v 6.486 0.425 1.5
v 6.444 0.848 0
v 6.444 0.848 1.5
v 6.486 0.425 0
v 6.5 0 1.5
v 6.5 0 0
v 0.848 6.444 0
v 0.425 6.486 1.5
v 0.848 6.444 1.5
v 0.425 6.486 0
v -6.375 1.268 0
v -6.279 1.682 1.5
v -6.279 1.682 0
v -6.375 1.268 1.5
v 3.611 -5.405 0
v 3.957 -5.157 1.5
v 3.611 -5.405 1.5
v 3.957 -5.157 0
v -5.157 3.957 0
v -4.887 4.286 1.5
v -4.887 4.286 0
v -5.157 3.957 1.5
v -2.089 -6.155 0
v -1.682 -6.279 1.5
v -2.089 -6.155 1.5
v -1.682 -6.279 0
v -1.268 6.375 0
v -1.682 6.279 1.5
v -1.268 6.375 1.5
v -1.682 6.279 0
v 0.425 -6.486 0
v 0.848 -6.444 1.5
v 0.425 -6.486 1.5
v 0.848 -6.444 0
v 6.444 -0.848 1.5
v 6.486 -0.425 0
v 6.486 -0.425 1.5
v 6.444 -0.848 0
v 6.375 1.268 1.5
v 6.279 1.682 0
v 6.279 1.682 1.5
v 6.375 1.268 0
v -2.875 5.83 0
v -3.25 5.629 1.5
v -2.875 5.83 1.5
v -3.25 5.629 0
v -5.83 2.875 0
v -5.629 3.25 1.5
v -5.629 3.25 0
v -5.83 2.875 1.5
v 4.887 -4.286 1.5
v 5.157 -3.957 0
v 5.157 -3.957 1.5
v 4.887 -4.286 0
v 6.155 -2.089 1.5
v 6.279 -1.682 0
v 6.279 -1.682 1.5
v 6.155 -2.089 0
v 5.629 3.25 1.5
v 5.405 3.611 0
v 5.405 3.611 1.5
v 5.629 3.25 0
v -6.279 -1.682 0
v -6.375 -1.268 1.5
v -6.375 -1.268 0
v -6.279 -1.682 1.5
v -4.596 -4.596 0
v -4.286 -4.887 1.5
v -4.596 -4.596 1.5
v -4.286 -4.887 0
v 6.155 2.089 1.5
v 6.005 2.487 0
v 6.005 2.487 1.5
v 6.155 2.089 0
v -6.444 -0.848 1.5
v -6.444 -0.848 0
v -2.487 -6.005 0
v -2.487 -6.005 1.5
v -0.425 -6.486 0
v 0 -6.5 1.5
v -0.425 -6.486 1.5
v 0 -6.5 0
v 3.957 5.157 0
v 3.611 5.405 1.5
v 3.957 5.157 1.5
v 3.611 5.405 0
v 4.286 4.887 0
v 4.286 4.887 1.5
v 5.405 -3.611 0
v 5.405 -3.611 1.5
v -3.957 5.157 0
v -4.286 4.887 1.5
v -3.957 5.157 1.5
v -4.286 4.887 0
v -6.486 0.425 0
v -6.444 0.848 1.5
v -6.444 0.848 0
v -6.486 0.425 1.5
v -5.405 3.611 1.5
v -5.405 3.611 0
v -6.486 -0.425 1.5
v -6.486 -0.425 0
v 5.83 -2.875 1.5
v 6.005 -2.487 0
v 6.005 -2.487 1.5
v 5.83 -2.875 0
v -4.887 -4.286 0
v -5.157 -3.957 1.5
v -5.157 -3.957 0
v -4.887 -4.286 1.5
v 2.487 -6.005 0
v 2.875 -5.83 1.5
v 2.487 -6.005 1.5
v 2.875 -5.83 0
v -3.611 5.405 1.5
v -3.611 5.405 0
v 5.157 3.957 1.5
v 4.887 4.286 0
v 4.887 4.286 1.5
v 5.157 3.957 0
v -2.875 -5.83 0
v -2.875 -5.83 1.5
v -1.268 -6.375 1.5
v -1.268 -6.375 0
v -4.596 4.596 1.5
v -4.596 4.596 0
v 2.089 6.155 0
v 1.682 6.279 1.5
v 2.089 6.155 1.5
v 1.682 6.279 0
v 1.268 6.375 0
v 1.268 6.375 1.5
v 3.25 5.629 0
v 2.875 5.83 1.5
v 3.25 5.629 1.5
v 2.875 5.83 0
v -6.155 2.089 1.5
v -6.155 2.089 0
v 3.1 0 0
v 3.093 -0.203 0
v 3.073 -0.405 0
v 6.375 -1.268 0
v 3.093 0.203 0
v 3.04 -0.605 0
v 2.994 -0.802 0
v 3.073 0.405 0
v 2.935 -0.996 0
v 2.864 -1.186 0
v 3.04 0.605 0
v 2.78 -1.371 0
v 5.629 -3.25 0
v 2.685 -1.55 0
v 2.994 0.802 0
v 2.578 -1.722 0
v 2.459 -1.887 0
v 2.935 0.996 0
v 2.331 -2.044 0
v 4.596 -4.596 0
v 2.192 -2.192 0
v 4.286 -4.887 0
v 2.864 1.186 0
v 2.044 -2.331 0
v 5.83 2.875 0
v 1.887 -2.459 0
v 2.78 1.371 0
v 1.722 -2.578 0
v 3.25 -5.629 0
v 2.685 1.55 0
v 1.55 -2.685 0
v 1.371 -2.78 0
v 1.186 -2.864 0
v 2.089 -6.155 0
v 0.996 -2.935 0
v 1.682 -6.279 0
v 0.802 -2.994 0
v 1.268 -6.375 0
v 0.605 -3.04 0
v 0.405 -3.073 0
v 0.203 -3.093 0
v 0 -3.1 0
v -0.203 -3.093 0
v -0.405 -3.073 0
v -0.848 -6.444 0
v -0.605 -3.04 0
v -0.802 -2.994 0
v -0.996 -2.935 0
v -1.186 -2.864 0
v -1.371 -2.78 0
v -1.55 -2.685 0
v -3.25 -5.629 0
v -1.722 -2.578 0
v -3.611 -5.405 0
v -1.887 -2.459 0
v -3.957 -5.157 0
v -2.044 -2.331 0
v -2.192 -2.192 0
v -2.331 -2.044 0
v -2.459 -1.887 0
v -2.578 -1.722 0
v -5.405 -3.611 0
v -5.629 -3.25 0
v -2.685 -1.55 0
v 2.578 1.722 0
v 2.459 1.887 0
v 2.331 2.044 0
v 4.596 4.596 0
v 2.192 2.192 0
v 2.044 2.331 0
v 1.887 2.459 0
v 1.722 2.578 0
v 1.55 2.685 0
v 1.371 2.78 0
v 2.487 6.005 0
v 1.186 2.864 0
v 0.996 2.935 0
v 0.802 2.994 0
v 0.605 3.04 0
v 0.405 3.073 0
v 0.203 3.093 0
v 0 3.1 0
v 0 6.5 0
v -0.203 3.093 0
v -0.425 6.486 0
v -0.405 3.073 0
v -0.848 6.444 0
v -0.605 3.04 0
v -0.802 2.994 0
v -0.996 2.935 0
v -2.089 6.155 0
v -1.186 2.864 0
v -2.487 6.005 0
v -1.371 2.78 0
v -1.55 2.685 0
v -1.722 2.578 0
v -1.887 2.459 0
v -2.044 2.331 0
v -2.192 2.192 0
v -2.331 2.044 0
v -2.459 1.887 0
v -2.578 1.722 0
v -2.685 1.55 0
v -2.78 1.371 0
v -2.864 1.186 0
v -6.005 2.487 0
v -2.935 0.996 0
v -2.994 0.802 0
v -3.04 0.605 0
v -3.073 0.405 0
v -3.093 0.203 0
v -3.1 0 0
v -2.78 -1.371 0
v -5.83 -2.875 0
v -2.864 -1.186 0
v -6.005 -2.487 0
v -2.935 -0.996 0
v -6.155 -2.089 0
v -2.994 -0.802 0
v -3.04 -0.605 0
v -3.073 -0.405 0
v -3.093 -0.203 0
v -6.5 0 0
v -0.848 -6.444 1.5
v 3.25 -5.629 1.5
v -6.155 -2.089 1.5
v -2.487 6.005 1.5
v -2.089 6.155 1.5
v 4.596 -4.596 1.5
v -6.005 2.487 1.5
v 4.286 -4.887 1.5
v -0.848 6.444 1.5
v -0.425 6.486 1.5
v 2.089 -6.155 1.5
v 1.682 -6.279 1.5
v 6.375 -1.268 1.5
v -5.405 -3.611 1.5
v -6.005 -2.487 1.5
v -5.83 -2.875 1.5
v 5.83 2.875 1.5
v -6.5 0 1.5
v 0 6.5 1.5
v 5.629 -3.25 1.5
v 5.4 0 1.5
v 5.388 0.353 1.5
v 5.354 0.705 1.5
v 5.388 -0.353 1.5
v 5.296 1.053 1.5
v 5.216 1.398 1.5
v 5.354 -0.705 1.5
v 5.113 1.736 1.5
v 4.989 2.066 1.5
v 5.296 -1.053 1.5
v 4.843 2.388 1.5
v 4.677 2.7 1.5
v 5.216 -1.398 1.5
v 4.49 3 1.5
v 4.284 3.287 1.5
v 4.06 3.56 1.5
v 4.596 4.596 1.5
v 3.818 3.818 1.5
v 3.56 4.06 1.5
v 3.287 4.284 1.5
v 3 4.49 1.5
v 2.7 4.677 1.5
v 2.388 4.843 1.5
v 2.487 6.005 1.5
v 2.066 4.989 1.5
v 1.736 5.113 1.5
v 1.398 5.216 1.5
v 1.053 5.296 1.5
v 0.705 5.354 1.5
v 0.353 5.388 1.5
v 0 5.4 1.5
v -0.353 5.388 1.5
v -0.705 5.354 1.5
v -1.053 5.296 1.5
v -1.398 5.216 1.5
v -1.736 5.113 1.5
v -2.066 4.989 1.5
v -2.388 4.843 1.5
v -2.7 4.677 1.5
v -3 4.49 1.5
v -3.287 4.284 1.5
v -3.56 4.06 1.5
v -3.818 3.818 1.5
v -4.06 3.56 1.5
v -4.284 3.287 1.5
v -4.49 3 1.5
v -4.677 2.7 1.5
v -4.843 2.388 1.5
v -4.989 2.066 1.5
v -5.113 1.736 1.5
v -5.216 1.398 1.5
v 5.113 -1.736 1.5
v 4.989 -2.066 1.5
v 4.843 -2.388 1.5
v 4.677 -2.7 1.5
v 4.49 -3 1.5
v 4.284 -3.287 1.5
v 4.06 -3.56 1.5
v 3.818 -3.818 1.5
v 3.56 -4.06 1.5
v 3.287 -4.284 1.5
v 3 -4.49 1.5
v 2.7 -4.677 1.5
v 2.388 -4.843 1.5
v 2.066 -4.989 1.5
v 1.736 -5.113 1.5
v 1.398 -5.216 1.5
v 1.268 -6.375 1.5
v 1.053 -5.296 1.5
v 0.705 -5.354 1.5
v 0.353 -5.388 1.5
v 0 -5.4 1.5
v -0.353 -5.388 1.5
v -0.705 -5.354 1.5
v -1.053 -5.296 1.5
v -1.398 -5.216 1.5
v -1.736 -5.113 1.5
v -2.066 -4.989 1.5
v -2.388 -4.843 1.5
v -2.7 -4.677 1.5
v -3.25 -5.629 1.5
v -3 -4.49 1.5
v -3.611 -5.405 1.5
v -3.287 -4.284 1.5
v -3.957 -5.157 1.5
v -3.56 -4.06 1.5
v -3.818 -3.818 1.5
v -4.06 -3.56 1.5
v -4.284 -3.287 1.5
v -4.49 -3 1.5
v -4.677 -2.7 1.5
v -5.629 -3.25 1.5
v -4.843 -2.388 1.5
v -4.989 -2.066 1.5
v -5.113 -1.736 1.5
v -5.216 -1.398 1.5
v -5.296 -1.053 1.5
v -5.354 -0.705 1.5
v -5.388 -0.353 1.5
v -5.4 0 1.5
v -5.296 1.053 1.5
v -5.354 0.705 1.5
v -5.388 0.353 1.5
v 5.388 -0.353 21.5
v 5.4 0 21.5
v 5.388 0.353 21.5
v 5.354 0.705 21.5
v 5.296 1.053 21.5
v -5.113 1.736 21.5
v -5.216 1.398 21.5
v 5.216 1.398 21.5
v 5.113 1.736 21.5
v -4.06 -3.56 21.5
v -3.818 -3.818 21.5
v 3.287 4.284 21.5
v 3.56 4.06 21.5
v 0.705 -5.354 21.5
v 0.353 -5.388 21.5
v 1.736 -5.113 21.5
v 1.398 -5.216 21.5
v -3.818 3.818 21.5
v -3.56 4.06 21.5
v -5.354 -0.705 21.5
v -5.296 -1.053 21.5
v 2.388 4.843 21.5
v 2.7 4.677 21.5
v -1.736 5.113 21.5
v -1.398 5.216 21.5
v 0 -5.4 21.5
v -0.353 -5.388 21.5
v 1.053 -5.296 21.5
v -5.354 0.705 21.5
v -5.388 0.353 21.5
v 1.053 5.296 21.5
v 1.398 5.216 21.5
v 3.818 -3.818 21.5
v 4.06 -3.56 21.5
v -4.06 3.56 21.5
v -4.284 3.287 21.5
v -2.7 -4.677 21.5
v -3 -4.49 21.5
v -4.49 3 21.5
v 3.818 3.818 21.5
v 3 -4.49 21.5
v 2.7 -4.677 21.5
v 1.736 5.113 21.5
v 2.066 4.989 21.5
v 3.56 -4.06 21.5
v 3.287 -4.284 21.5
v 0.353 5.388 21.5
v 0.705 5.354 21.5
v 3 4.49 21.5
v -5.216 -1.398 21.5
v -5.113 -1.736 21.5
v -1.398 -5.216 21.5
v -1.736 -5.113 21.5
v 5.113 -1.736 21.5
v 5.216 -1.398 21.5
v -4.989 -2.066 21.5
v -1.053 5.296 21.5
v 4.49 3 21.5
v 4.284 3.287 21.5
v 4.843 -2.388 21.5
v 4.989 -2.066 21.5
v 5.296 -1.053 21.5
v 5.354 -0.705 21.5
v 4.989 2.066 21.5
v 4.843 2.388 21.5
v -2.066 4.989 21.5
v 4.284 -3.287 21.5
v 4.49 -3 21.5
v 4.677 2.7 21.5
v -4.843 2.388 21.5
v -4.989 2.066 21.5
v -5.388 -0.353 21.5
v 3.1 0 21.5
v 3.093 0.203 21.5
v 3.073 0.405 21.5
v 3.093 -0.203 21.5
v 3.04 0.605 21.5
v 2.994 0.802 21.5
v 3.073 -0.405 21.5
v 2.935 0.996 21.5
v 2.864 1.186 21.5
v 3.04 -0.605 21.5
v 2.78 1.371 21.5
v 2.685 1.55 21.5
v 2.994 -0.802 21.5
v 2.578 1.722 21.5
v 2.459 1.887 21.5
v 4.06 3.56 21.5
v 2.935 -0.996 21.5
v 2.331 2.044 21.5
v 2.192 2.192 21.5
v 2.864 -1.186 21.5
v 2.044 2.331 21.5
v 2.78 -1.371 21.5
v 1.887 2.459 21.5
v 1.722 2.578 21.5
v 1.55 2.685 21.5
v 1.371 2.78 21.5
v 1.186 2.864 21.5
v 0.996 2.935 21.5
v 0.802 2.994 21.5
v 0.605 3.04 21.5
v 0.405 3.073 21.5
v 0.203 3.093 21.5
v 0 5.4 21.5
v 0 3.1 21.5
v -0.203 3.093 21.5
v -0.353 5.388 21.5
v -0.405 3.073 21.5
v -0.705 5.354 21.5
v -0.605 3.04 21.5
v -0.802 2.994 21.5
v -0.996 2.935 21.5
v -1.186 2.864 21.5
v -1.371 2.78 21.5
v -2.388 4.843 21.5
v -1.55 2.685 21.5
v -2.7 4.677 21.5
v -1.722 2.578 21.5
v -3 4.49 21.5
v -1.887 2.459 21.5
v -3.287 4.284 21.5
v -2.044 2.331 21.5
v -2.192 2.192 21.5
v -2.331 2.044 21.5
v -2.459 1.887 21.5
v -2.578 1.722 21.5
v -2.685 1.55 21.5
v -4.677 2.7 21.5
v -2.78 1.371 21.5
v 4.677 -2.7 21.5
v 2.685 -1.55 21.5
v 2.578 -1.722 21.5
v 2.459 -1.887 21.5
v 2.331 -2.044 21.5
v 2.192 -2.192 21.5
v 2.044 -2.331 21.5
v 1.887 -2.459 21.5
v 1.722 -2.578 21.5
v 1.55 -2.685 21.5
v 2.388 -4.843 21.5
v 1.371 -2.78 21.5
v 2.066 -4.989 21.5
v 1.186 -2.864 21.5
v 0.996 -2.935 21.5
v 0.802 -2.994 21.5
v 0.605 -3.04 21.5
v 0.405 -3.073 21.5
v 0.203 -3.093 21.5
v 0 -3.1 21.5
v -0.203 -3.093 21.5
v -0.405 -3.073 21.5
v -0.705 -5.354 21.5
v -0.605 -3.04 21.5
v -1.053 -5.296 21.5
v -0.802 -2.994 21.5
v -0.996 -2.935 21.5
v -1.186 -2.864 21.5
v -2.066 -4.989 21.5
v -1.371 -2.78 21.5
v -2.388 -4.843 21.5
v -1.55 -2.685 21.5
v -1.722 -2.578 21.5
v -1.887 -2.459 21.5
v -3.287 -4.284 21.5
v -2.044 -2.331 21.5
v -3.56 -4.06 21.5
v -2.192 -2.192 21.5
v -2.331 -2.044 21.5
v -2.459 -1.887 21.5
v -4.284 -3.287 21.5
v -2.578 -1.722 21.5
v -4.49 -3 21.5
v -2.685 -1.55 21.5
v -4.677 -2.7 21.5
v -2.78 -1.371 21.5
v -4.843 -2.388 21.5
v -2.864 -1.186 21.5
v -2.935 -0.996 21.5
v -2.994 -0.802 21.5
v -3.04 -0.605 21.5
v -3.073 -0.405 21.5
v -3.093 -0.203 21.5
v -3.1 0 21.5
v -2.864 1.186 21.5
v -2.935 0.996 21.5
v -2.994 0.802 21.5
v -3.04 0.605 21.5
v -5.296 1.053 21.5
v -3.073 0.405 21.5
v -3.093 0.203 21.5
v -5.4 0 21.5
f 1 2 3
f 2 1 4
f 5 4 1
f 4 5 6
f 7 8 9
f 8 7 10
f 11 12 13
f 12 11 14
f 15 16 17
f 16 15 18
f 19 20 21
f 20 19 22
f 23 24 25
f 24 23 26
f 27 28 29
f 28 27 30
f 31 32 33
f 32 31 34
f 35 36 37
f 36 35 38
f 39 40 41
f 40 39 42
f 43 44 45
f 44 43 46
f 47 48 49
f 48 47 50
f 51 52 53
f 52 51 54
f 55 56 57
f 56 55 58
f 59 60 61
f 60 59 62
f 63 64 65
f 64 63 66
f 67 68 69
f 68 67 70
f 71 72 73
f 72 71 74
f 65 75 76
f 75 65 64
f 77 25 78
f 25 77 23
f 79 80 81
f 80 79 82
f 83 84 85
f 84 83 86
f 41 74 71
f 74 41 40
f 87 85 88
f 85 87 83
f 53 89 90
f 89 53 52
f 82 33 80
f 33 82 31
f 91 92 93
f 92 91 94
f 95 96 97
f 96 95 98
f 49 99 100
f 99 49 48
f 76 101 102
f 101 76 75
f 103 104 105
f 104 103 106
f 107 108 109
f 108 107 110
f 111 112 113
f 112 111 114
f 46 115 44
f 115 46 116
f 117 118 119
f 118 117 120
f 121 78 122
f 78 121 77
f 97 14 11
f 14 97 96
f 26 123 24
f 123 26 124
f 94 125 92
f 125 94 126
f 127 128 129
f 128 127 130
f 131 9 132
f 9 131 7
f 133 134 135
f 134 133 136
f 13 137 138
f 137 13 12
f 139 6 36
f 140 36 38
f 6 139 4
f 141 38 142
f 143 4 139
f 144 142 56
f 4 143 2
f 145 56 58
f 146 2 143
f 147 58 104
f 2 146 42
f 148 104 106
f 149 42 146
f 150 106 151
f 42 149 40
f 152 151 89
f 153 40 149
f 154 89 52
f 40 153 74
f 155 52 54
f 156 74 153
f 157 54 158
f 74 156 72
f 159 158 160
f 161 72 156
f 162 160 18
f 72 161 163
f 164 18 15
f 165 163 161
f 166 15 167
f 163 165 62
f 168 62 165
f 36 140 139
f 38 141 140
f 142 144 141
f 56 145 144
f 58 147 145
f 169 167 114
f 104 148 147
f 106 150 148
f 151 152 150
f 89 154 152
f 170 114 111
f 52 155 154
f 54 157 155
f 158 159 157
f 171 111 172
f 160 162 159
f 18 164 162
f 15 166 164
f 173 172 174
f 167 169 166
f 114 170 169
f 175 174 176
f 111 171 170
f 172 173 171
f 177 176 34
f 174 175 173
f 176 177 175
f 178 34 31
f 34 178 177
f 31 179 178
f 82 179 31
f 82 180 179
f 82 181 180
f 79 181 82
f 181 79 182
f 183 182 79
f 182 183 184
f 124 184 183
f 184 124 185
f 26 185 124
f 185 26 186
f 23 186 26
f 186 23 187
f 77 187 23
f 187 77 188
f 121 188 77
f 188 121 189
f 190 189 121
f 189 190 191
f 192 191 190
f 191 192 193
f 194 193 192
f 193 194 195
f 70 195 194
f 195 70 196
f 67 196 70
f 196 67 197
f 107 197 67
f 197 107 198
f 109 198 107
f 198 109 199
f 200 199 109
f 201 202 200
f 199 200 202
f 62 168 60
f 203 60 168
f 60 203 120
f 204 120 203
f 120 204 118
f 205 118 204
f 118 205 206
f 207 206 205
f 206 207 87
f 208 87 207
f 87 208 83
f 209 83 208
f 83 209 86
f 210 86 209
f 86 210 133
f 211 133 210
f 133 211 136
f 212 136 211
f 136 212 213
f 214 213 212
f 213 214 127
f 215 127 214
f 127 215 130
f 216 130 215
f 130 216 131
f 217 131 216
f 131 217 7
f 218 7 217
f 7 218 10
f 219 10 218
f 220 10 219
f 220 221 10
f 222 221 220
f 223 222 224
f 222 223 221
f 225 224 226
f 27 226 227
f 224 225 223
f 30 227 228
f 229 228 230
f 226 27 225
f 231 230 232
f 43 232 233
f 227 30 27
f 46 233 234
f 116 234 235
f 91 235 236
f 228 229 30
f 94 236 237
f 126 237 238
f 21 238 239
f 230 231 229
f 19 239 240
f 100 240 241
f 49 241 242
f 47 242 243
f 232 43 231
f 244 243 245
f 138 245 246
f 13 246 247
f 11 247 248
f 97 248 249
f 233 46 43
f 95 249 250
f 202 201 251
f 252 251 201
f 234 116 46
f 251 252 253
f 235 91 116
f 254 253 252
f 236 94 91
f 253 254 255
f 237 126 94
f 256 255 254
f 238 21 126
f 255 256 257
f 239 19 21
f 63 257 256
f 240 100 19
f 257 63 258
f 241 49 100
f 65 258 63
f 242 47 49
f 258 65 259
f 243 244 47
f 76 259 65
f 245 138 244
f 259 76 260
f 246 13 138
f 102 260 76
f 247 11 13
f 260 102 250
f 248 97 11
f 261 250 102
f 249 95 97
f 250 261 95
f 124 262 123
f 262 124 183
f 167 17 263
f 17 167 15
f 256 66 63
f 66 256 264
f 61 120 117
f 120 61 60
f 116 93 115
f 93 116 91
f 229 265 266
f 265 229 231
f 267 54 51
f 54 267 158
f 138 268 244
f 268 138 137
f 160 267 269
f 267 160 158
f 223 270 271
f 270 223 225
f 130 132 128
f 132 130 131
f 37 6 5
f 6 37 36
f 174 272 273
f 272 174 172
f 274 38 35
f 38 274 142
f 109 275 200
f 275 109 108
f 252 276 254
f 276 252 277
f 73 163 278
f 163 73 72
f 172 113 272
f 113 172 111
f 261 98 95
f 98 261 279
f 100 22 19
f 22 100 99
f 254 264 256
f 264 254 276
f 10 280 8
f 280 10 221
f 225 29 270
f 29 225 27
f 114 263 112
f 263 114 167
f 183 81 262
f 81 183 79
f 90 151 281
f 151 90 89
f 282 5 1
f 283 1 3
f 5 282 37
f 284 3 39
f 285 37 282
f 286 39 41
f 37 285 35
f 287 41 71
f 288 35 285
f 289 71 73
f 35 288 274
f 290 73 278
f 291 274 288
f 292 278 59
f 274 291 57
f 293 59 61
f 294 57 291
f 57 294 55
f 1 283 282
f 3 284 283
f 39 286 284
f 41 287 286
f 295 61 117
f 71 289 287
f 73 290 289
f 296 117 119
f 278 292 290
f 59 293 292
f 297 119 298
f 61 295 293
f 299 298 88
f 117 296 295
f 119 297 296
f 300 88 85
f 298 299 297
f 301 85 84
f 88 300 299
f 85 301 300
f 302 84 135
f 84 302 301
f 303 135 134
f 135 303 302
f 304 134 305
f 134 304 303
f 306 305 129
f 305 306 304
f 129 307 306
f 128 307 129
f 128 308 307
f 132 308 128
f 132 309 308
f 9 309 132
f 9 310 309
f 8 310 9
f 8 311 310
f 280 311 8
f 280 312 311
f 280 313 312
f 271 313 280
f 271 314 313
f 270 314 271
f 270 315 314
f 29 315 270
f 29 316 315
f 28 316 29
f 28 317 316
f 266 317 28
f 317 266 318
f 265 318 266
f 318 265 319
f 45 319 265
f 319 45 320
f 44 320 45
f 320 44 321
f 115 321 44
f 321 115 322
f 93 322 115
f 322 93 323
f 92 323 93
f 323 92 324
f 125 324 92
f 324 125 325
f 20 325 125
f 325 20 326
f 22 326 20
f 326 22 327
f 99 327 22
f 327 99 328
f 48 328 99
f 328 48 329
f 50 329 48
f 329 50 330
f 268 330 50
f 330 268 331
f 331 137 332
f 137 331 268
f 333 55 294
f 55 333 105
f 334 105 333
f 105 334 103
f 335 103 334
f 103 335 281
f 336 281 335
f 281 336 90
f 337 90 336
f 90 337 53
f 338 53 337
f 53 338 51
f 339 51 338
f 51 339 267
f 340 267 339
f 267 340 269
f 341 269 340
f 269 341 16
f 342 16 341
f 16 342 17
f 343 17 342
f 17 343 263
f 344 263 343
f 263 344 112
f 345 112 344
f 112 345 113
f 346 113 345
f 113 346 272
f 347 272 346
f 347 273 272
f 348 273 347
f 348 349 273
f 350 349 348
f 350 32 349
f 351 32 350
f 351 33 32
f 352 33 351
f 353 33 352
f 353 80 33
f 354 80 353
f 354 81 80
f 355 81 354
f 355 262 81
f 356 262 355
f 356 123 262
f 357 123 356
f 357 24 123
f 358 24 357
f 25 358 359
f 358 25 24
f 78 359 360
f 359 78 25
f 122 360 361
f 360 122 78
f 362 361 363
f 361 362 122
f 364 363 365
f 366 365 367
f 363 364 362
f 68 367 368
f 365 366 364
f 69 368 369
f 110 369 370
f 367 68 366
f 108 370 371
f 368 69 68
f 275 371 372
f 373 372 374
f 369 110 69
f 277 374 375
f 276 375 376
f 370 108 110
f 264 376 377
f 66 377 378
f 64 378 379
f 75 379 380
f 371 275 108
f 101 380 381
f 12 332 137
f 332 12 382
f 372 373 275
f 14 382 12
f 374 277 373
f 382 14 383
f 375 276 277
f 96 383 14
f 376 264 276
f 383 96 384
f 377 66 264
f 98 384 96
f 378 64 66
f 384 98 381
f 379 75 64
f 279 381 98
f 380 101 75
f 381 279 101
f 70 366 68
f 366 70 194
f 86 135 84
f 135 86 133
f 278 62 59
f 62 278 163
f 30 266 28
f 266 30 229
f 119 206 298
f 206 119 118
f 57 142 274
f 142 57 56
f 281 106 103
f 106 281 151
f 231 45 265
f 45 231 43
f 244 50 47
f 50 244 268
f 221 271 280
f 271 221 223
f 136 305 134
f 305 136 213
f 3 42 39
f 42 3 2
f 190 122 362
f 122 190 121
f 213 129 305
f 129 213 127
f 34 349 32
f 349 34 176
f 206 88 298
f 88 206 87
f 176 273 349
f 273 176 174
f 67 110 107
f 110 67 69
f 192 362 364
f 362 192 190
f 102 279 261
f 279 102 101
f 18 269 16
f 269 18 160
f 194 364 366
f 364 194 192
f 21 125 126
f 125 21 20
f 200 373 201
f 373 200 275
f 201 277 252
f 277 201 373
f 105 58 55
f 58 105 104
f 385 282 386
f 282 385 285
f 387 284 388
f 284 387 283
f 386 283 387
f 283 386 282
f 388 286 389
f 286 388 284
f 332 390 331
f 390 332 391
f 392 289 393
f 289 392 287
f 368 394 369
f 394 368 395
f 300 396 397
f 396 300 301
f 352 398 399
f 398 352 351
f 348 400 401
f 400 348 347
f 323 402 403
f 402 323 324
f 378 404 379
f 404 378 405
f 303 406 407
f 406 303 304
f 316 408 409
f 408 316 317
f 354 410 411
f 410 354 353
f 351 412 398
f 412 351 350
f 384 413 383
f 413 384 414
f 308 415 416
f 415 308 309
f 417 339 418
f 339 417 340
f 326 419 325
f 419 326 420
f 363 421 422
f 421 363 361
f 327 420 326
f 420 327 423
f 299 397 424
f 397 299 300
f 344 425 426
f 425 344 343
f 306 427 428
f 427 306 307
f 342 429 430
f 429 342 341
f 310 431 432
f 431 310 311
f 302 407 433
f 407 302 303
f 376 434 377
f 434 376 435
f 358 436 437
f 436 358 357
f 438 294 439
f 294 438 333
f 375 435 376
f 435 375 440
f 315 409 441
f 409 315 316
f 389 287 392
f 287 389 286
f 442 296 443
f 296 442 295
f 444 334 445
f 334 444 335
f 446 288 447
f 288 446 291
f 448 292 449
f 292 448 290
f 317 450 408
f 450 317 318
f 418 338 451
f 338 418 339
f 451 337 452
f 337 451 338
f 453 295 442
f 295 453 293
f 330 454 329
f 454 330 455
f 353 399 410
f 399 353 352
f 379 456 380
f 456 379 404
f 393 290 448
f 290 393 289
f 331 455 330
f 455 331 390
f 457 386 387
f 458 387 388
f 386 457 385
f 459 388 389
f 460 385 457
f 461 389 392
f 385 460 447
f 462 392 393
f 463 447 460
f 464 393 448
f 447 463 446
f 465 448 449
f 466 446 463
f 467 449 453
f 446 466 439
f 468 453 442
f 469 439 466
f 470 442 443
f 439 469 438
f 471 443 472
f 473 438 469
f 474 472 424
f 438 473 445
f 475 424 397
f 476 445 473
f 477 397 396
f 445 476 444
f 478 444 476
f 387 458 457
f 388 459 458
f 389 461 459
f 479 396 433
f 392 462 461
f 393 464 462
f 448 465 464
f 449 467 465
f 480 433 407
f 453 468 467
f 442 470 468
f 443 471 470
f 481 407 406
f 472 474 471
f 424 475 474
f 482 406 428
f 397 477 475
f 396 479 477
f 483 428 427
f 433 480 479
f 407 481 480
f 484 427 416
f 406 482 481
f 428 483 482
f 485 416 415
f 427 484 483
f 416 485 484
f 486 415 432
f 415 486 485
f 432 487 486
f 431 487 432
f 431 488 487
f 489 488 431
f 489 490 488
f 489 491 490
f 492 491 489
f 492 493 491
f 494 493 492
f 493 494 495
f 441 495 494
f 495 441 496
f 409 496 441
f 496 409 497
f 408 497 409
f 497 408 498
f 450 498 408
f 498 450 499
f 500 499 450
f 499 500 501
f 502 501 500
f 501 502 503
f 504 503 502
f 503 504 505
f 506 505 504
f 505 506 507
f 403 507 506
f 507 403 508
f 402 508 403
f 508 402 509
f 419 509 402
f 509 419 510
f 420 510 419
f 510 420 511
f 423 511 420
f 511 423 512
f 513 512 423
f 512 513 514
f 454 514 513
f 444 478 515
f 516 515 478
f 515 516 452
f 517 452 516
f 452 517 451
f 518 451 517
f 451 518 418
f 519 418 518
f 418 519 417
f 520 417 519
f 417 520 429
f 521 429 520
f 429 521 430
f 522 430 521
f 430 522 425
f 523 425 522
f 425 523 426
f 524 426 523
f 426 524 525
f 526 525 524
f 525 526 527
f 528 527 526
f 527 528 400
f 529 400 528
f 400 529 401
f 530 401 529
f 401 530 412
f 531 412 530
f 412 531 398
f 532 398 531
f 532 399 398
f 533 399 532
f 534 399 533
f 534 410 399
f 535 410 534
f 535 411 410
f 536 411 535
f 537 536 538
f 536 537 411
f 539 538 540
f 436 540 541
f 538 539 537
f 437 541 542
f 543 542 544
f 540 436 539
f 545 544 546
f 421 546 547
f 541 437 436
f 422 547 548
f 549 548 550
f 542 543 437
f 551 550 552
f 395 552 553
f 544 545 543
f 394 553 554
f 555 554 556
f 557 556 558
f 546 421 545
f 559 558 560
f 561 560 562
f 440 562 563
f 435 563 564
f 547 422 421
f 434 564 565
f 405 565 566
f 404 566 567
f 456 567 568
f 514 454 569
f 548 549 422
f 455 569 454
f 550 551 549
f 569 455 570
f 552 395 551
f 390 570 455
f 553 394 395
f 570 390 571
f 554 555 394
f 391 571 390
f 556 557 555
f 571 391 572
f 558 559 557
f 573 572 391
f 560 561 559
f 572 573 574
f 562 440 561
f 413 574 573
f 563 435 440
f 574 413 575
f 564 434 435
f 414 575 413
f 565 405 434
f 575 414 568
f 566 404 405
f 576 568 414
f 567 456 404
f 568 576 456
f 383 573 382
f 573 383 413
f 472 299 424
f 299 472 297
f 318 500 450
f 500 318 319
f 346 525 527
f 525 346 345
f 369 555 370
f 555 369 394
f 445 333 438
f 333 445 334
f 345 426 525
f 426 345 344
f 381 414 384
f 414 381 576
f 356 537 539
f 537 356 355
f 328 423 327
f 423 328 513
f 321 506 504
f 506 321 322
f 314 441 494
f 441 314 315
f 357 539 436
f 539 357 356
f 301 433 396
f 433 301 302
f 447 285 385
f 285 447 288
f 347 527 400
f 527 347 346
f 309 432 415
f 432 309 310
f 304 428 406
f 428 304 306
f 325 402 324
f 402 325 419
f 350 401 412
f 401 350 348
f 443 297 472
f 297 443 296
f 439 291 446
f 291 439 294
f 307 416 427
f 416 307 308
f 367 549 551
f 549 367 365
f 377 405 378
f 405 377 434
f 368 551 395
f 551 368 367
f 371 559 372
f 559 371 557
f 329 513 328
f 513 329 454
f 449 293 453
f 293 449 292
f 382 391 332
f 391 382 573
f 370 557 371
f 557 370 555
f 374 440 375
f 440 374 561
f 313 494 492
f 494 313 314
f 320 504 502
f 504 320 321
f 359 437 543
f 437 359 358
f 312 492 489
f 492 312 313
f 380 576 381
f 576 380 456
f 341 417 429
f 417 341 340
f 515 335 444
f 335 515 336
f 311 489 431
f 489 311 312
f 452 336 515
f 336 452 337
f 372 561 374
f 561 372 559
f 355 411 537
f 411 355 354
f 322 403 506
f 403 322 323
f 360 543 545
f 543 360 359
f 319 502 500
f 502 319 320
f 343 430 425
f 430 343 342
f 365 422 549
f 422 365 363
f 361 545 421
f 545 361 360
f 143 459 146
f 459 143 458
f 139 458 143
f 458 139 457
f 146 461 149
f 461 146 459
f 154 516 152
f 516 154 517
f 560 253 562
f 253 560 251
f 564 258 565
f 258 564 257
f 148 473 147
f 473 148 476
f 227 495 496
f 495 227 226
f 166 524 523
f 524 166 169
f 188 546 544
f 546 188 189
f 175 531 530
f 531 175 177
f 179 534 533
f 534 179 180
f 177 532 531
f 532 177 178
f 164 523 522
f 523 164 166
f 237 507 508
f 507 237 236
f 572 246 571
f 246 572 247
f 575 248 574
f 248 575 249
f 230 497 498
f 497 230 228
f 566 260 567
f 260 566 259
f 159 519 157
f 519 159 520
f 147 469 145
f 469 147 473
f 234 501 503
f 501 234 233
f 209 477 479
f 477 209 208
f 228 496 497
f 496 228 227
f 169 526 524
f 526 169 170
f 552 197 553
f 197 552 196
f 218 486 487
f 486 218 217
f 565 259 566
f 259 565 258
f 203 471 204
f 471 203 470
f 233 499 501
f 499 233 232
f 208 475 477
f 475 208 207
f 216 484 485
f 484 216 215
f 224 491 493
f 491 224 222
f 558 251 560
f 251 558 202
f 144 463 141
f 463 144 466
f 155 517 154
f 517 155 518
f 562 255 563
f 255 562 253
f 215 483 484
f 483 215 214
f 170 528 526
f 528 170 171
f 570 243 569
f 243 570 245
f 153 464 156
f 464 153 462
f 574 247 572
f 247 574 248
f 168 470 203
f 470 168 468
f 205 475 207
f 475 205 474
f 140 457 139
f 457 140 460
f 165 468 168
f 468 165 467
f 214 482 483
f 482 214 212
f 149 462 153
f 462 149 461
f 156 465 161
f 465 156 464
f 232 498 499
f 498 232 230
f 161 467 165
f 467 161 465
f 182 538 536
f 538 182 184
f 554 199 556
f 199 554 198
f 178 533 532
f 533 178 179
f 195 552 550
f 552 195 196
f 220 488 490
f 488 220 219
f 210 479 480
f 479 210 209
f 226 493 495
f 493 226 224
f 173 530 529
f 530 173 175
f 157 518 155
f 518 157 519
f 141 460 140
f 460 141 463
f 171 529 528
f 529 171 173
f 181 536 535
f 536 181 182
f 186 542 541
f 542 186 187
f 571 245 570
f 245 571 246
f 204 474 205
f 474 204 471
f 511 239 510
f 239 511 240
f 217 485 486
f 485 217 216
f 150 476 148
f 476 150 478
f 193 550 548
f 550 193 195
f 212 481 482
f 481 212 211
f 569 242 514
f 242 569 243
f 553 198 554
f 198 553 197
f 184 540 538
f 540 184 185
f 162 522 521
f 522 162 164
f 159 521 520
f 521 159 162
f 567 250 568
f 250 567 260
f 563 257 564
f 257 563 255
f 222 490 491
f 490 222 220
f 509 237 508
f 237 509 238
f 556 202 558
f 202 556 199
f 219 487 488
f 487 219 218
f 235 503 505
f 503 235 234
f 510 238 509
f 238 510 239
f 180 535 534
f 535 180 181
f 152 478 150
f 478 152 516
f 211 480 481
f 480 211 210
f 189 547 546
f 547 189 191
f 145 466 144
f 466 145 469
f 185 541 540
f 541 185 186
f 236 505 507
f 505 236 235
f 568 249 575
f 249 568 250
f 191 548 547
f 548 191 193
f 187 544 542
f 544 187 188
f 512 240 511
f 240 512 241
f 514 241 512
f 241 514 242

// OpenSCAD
// PCR tube adapter sleeve - print upside down
// Units: mm

$fn = 96;

// --- Dimensions ---
collar_d      = 13;    // collar outer diameter
collar_h      = 1.5;   // collar thickness (z = 0 to 1.5)
sleeve_od     = 10.8;  // sleeve outer diameter
sleeve_top_z  = 21.5;  // top of sleeve body
bore_d        = 6.2;   // through-bore diameter
eps           = 0.5;   // cutter overshoot

// --- Model ---
difference() {
    union() {
        // Collar on the bed
        cylinder(d = collar_d, h = collar_h);
        // Sleeve body rising from the collar
        translate([0, 0, collar_h])
            cylinder(d = sleeve_od, h = sleeve_top_z - collar_h);
    }
    // Bore through full height
    translate([0, 0, -eps])
        cylinder(d = bore_d, h = sleeve_top_z + 2 * eps);
}
